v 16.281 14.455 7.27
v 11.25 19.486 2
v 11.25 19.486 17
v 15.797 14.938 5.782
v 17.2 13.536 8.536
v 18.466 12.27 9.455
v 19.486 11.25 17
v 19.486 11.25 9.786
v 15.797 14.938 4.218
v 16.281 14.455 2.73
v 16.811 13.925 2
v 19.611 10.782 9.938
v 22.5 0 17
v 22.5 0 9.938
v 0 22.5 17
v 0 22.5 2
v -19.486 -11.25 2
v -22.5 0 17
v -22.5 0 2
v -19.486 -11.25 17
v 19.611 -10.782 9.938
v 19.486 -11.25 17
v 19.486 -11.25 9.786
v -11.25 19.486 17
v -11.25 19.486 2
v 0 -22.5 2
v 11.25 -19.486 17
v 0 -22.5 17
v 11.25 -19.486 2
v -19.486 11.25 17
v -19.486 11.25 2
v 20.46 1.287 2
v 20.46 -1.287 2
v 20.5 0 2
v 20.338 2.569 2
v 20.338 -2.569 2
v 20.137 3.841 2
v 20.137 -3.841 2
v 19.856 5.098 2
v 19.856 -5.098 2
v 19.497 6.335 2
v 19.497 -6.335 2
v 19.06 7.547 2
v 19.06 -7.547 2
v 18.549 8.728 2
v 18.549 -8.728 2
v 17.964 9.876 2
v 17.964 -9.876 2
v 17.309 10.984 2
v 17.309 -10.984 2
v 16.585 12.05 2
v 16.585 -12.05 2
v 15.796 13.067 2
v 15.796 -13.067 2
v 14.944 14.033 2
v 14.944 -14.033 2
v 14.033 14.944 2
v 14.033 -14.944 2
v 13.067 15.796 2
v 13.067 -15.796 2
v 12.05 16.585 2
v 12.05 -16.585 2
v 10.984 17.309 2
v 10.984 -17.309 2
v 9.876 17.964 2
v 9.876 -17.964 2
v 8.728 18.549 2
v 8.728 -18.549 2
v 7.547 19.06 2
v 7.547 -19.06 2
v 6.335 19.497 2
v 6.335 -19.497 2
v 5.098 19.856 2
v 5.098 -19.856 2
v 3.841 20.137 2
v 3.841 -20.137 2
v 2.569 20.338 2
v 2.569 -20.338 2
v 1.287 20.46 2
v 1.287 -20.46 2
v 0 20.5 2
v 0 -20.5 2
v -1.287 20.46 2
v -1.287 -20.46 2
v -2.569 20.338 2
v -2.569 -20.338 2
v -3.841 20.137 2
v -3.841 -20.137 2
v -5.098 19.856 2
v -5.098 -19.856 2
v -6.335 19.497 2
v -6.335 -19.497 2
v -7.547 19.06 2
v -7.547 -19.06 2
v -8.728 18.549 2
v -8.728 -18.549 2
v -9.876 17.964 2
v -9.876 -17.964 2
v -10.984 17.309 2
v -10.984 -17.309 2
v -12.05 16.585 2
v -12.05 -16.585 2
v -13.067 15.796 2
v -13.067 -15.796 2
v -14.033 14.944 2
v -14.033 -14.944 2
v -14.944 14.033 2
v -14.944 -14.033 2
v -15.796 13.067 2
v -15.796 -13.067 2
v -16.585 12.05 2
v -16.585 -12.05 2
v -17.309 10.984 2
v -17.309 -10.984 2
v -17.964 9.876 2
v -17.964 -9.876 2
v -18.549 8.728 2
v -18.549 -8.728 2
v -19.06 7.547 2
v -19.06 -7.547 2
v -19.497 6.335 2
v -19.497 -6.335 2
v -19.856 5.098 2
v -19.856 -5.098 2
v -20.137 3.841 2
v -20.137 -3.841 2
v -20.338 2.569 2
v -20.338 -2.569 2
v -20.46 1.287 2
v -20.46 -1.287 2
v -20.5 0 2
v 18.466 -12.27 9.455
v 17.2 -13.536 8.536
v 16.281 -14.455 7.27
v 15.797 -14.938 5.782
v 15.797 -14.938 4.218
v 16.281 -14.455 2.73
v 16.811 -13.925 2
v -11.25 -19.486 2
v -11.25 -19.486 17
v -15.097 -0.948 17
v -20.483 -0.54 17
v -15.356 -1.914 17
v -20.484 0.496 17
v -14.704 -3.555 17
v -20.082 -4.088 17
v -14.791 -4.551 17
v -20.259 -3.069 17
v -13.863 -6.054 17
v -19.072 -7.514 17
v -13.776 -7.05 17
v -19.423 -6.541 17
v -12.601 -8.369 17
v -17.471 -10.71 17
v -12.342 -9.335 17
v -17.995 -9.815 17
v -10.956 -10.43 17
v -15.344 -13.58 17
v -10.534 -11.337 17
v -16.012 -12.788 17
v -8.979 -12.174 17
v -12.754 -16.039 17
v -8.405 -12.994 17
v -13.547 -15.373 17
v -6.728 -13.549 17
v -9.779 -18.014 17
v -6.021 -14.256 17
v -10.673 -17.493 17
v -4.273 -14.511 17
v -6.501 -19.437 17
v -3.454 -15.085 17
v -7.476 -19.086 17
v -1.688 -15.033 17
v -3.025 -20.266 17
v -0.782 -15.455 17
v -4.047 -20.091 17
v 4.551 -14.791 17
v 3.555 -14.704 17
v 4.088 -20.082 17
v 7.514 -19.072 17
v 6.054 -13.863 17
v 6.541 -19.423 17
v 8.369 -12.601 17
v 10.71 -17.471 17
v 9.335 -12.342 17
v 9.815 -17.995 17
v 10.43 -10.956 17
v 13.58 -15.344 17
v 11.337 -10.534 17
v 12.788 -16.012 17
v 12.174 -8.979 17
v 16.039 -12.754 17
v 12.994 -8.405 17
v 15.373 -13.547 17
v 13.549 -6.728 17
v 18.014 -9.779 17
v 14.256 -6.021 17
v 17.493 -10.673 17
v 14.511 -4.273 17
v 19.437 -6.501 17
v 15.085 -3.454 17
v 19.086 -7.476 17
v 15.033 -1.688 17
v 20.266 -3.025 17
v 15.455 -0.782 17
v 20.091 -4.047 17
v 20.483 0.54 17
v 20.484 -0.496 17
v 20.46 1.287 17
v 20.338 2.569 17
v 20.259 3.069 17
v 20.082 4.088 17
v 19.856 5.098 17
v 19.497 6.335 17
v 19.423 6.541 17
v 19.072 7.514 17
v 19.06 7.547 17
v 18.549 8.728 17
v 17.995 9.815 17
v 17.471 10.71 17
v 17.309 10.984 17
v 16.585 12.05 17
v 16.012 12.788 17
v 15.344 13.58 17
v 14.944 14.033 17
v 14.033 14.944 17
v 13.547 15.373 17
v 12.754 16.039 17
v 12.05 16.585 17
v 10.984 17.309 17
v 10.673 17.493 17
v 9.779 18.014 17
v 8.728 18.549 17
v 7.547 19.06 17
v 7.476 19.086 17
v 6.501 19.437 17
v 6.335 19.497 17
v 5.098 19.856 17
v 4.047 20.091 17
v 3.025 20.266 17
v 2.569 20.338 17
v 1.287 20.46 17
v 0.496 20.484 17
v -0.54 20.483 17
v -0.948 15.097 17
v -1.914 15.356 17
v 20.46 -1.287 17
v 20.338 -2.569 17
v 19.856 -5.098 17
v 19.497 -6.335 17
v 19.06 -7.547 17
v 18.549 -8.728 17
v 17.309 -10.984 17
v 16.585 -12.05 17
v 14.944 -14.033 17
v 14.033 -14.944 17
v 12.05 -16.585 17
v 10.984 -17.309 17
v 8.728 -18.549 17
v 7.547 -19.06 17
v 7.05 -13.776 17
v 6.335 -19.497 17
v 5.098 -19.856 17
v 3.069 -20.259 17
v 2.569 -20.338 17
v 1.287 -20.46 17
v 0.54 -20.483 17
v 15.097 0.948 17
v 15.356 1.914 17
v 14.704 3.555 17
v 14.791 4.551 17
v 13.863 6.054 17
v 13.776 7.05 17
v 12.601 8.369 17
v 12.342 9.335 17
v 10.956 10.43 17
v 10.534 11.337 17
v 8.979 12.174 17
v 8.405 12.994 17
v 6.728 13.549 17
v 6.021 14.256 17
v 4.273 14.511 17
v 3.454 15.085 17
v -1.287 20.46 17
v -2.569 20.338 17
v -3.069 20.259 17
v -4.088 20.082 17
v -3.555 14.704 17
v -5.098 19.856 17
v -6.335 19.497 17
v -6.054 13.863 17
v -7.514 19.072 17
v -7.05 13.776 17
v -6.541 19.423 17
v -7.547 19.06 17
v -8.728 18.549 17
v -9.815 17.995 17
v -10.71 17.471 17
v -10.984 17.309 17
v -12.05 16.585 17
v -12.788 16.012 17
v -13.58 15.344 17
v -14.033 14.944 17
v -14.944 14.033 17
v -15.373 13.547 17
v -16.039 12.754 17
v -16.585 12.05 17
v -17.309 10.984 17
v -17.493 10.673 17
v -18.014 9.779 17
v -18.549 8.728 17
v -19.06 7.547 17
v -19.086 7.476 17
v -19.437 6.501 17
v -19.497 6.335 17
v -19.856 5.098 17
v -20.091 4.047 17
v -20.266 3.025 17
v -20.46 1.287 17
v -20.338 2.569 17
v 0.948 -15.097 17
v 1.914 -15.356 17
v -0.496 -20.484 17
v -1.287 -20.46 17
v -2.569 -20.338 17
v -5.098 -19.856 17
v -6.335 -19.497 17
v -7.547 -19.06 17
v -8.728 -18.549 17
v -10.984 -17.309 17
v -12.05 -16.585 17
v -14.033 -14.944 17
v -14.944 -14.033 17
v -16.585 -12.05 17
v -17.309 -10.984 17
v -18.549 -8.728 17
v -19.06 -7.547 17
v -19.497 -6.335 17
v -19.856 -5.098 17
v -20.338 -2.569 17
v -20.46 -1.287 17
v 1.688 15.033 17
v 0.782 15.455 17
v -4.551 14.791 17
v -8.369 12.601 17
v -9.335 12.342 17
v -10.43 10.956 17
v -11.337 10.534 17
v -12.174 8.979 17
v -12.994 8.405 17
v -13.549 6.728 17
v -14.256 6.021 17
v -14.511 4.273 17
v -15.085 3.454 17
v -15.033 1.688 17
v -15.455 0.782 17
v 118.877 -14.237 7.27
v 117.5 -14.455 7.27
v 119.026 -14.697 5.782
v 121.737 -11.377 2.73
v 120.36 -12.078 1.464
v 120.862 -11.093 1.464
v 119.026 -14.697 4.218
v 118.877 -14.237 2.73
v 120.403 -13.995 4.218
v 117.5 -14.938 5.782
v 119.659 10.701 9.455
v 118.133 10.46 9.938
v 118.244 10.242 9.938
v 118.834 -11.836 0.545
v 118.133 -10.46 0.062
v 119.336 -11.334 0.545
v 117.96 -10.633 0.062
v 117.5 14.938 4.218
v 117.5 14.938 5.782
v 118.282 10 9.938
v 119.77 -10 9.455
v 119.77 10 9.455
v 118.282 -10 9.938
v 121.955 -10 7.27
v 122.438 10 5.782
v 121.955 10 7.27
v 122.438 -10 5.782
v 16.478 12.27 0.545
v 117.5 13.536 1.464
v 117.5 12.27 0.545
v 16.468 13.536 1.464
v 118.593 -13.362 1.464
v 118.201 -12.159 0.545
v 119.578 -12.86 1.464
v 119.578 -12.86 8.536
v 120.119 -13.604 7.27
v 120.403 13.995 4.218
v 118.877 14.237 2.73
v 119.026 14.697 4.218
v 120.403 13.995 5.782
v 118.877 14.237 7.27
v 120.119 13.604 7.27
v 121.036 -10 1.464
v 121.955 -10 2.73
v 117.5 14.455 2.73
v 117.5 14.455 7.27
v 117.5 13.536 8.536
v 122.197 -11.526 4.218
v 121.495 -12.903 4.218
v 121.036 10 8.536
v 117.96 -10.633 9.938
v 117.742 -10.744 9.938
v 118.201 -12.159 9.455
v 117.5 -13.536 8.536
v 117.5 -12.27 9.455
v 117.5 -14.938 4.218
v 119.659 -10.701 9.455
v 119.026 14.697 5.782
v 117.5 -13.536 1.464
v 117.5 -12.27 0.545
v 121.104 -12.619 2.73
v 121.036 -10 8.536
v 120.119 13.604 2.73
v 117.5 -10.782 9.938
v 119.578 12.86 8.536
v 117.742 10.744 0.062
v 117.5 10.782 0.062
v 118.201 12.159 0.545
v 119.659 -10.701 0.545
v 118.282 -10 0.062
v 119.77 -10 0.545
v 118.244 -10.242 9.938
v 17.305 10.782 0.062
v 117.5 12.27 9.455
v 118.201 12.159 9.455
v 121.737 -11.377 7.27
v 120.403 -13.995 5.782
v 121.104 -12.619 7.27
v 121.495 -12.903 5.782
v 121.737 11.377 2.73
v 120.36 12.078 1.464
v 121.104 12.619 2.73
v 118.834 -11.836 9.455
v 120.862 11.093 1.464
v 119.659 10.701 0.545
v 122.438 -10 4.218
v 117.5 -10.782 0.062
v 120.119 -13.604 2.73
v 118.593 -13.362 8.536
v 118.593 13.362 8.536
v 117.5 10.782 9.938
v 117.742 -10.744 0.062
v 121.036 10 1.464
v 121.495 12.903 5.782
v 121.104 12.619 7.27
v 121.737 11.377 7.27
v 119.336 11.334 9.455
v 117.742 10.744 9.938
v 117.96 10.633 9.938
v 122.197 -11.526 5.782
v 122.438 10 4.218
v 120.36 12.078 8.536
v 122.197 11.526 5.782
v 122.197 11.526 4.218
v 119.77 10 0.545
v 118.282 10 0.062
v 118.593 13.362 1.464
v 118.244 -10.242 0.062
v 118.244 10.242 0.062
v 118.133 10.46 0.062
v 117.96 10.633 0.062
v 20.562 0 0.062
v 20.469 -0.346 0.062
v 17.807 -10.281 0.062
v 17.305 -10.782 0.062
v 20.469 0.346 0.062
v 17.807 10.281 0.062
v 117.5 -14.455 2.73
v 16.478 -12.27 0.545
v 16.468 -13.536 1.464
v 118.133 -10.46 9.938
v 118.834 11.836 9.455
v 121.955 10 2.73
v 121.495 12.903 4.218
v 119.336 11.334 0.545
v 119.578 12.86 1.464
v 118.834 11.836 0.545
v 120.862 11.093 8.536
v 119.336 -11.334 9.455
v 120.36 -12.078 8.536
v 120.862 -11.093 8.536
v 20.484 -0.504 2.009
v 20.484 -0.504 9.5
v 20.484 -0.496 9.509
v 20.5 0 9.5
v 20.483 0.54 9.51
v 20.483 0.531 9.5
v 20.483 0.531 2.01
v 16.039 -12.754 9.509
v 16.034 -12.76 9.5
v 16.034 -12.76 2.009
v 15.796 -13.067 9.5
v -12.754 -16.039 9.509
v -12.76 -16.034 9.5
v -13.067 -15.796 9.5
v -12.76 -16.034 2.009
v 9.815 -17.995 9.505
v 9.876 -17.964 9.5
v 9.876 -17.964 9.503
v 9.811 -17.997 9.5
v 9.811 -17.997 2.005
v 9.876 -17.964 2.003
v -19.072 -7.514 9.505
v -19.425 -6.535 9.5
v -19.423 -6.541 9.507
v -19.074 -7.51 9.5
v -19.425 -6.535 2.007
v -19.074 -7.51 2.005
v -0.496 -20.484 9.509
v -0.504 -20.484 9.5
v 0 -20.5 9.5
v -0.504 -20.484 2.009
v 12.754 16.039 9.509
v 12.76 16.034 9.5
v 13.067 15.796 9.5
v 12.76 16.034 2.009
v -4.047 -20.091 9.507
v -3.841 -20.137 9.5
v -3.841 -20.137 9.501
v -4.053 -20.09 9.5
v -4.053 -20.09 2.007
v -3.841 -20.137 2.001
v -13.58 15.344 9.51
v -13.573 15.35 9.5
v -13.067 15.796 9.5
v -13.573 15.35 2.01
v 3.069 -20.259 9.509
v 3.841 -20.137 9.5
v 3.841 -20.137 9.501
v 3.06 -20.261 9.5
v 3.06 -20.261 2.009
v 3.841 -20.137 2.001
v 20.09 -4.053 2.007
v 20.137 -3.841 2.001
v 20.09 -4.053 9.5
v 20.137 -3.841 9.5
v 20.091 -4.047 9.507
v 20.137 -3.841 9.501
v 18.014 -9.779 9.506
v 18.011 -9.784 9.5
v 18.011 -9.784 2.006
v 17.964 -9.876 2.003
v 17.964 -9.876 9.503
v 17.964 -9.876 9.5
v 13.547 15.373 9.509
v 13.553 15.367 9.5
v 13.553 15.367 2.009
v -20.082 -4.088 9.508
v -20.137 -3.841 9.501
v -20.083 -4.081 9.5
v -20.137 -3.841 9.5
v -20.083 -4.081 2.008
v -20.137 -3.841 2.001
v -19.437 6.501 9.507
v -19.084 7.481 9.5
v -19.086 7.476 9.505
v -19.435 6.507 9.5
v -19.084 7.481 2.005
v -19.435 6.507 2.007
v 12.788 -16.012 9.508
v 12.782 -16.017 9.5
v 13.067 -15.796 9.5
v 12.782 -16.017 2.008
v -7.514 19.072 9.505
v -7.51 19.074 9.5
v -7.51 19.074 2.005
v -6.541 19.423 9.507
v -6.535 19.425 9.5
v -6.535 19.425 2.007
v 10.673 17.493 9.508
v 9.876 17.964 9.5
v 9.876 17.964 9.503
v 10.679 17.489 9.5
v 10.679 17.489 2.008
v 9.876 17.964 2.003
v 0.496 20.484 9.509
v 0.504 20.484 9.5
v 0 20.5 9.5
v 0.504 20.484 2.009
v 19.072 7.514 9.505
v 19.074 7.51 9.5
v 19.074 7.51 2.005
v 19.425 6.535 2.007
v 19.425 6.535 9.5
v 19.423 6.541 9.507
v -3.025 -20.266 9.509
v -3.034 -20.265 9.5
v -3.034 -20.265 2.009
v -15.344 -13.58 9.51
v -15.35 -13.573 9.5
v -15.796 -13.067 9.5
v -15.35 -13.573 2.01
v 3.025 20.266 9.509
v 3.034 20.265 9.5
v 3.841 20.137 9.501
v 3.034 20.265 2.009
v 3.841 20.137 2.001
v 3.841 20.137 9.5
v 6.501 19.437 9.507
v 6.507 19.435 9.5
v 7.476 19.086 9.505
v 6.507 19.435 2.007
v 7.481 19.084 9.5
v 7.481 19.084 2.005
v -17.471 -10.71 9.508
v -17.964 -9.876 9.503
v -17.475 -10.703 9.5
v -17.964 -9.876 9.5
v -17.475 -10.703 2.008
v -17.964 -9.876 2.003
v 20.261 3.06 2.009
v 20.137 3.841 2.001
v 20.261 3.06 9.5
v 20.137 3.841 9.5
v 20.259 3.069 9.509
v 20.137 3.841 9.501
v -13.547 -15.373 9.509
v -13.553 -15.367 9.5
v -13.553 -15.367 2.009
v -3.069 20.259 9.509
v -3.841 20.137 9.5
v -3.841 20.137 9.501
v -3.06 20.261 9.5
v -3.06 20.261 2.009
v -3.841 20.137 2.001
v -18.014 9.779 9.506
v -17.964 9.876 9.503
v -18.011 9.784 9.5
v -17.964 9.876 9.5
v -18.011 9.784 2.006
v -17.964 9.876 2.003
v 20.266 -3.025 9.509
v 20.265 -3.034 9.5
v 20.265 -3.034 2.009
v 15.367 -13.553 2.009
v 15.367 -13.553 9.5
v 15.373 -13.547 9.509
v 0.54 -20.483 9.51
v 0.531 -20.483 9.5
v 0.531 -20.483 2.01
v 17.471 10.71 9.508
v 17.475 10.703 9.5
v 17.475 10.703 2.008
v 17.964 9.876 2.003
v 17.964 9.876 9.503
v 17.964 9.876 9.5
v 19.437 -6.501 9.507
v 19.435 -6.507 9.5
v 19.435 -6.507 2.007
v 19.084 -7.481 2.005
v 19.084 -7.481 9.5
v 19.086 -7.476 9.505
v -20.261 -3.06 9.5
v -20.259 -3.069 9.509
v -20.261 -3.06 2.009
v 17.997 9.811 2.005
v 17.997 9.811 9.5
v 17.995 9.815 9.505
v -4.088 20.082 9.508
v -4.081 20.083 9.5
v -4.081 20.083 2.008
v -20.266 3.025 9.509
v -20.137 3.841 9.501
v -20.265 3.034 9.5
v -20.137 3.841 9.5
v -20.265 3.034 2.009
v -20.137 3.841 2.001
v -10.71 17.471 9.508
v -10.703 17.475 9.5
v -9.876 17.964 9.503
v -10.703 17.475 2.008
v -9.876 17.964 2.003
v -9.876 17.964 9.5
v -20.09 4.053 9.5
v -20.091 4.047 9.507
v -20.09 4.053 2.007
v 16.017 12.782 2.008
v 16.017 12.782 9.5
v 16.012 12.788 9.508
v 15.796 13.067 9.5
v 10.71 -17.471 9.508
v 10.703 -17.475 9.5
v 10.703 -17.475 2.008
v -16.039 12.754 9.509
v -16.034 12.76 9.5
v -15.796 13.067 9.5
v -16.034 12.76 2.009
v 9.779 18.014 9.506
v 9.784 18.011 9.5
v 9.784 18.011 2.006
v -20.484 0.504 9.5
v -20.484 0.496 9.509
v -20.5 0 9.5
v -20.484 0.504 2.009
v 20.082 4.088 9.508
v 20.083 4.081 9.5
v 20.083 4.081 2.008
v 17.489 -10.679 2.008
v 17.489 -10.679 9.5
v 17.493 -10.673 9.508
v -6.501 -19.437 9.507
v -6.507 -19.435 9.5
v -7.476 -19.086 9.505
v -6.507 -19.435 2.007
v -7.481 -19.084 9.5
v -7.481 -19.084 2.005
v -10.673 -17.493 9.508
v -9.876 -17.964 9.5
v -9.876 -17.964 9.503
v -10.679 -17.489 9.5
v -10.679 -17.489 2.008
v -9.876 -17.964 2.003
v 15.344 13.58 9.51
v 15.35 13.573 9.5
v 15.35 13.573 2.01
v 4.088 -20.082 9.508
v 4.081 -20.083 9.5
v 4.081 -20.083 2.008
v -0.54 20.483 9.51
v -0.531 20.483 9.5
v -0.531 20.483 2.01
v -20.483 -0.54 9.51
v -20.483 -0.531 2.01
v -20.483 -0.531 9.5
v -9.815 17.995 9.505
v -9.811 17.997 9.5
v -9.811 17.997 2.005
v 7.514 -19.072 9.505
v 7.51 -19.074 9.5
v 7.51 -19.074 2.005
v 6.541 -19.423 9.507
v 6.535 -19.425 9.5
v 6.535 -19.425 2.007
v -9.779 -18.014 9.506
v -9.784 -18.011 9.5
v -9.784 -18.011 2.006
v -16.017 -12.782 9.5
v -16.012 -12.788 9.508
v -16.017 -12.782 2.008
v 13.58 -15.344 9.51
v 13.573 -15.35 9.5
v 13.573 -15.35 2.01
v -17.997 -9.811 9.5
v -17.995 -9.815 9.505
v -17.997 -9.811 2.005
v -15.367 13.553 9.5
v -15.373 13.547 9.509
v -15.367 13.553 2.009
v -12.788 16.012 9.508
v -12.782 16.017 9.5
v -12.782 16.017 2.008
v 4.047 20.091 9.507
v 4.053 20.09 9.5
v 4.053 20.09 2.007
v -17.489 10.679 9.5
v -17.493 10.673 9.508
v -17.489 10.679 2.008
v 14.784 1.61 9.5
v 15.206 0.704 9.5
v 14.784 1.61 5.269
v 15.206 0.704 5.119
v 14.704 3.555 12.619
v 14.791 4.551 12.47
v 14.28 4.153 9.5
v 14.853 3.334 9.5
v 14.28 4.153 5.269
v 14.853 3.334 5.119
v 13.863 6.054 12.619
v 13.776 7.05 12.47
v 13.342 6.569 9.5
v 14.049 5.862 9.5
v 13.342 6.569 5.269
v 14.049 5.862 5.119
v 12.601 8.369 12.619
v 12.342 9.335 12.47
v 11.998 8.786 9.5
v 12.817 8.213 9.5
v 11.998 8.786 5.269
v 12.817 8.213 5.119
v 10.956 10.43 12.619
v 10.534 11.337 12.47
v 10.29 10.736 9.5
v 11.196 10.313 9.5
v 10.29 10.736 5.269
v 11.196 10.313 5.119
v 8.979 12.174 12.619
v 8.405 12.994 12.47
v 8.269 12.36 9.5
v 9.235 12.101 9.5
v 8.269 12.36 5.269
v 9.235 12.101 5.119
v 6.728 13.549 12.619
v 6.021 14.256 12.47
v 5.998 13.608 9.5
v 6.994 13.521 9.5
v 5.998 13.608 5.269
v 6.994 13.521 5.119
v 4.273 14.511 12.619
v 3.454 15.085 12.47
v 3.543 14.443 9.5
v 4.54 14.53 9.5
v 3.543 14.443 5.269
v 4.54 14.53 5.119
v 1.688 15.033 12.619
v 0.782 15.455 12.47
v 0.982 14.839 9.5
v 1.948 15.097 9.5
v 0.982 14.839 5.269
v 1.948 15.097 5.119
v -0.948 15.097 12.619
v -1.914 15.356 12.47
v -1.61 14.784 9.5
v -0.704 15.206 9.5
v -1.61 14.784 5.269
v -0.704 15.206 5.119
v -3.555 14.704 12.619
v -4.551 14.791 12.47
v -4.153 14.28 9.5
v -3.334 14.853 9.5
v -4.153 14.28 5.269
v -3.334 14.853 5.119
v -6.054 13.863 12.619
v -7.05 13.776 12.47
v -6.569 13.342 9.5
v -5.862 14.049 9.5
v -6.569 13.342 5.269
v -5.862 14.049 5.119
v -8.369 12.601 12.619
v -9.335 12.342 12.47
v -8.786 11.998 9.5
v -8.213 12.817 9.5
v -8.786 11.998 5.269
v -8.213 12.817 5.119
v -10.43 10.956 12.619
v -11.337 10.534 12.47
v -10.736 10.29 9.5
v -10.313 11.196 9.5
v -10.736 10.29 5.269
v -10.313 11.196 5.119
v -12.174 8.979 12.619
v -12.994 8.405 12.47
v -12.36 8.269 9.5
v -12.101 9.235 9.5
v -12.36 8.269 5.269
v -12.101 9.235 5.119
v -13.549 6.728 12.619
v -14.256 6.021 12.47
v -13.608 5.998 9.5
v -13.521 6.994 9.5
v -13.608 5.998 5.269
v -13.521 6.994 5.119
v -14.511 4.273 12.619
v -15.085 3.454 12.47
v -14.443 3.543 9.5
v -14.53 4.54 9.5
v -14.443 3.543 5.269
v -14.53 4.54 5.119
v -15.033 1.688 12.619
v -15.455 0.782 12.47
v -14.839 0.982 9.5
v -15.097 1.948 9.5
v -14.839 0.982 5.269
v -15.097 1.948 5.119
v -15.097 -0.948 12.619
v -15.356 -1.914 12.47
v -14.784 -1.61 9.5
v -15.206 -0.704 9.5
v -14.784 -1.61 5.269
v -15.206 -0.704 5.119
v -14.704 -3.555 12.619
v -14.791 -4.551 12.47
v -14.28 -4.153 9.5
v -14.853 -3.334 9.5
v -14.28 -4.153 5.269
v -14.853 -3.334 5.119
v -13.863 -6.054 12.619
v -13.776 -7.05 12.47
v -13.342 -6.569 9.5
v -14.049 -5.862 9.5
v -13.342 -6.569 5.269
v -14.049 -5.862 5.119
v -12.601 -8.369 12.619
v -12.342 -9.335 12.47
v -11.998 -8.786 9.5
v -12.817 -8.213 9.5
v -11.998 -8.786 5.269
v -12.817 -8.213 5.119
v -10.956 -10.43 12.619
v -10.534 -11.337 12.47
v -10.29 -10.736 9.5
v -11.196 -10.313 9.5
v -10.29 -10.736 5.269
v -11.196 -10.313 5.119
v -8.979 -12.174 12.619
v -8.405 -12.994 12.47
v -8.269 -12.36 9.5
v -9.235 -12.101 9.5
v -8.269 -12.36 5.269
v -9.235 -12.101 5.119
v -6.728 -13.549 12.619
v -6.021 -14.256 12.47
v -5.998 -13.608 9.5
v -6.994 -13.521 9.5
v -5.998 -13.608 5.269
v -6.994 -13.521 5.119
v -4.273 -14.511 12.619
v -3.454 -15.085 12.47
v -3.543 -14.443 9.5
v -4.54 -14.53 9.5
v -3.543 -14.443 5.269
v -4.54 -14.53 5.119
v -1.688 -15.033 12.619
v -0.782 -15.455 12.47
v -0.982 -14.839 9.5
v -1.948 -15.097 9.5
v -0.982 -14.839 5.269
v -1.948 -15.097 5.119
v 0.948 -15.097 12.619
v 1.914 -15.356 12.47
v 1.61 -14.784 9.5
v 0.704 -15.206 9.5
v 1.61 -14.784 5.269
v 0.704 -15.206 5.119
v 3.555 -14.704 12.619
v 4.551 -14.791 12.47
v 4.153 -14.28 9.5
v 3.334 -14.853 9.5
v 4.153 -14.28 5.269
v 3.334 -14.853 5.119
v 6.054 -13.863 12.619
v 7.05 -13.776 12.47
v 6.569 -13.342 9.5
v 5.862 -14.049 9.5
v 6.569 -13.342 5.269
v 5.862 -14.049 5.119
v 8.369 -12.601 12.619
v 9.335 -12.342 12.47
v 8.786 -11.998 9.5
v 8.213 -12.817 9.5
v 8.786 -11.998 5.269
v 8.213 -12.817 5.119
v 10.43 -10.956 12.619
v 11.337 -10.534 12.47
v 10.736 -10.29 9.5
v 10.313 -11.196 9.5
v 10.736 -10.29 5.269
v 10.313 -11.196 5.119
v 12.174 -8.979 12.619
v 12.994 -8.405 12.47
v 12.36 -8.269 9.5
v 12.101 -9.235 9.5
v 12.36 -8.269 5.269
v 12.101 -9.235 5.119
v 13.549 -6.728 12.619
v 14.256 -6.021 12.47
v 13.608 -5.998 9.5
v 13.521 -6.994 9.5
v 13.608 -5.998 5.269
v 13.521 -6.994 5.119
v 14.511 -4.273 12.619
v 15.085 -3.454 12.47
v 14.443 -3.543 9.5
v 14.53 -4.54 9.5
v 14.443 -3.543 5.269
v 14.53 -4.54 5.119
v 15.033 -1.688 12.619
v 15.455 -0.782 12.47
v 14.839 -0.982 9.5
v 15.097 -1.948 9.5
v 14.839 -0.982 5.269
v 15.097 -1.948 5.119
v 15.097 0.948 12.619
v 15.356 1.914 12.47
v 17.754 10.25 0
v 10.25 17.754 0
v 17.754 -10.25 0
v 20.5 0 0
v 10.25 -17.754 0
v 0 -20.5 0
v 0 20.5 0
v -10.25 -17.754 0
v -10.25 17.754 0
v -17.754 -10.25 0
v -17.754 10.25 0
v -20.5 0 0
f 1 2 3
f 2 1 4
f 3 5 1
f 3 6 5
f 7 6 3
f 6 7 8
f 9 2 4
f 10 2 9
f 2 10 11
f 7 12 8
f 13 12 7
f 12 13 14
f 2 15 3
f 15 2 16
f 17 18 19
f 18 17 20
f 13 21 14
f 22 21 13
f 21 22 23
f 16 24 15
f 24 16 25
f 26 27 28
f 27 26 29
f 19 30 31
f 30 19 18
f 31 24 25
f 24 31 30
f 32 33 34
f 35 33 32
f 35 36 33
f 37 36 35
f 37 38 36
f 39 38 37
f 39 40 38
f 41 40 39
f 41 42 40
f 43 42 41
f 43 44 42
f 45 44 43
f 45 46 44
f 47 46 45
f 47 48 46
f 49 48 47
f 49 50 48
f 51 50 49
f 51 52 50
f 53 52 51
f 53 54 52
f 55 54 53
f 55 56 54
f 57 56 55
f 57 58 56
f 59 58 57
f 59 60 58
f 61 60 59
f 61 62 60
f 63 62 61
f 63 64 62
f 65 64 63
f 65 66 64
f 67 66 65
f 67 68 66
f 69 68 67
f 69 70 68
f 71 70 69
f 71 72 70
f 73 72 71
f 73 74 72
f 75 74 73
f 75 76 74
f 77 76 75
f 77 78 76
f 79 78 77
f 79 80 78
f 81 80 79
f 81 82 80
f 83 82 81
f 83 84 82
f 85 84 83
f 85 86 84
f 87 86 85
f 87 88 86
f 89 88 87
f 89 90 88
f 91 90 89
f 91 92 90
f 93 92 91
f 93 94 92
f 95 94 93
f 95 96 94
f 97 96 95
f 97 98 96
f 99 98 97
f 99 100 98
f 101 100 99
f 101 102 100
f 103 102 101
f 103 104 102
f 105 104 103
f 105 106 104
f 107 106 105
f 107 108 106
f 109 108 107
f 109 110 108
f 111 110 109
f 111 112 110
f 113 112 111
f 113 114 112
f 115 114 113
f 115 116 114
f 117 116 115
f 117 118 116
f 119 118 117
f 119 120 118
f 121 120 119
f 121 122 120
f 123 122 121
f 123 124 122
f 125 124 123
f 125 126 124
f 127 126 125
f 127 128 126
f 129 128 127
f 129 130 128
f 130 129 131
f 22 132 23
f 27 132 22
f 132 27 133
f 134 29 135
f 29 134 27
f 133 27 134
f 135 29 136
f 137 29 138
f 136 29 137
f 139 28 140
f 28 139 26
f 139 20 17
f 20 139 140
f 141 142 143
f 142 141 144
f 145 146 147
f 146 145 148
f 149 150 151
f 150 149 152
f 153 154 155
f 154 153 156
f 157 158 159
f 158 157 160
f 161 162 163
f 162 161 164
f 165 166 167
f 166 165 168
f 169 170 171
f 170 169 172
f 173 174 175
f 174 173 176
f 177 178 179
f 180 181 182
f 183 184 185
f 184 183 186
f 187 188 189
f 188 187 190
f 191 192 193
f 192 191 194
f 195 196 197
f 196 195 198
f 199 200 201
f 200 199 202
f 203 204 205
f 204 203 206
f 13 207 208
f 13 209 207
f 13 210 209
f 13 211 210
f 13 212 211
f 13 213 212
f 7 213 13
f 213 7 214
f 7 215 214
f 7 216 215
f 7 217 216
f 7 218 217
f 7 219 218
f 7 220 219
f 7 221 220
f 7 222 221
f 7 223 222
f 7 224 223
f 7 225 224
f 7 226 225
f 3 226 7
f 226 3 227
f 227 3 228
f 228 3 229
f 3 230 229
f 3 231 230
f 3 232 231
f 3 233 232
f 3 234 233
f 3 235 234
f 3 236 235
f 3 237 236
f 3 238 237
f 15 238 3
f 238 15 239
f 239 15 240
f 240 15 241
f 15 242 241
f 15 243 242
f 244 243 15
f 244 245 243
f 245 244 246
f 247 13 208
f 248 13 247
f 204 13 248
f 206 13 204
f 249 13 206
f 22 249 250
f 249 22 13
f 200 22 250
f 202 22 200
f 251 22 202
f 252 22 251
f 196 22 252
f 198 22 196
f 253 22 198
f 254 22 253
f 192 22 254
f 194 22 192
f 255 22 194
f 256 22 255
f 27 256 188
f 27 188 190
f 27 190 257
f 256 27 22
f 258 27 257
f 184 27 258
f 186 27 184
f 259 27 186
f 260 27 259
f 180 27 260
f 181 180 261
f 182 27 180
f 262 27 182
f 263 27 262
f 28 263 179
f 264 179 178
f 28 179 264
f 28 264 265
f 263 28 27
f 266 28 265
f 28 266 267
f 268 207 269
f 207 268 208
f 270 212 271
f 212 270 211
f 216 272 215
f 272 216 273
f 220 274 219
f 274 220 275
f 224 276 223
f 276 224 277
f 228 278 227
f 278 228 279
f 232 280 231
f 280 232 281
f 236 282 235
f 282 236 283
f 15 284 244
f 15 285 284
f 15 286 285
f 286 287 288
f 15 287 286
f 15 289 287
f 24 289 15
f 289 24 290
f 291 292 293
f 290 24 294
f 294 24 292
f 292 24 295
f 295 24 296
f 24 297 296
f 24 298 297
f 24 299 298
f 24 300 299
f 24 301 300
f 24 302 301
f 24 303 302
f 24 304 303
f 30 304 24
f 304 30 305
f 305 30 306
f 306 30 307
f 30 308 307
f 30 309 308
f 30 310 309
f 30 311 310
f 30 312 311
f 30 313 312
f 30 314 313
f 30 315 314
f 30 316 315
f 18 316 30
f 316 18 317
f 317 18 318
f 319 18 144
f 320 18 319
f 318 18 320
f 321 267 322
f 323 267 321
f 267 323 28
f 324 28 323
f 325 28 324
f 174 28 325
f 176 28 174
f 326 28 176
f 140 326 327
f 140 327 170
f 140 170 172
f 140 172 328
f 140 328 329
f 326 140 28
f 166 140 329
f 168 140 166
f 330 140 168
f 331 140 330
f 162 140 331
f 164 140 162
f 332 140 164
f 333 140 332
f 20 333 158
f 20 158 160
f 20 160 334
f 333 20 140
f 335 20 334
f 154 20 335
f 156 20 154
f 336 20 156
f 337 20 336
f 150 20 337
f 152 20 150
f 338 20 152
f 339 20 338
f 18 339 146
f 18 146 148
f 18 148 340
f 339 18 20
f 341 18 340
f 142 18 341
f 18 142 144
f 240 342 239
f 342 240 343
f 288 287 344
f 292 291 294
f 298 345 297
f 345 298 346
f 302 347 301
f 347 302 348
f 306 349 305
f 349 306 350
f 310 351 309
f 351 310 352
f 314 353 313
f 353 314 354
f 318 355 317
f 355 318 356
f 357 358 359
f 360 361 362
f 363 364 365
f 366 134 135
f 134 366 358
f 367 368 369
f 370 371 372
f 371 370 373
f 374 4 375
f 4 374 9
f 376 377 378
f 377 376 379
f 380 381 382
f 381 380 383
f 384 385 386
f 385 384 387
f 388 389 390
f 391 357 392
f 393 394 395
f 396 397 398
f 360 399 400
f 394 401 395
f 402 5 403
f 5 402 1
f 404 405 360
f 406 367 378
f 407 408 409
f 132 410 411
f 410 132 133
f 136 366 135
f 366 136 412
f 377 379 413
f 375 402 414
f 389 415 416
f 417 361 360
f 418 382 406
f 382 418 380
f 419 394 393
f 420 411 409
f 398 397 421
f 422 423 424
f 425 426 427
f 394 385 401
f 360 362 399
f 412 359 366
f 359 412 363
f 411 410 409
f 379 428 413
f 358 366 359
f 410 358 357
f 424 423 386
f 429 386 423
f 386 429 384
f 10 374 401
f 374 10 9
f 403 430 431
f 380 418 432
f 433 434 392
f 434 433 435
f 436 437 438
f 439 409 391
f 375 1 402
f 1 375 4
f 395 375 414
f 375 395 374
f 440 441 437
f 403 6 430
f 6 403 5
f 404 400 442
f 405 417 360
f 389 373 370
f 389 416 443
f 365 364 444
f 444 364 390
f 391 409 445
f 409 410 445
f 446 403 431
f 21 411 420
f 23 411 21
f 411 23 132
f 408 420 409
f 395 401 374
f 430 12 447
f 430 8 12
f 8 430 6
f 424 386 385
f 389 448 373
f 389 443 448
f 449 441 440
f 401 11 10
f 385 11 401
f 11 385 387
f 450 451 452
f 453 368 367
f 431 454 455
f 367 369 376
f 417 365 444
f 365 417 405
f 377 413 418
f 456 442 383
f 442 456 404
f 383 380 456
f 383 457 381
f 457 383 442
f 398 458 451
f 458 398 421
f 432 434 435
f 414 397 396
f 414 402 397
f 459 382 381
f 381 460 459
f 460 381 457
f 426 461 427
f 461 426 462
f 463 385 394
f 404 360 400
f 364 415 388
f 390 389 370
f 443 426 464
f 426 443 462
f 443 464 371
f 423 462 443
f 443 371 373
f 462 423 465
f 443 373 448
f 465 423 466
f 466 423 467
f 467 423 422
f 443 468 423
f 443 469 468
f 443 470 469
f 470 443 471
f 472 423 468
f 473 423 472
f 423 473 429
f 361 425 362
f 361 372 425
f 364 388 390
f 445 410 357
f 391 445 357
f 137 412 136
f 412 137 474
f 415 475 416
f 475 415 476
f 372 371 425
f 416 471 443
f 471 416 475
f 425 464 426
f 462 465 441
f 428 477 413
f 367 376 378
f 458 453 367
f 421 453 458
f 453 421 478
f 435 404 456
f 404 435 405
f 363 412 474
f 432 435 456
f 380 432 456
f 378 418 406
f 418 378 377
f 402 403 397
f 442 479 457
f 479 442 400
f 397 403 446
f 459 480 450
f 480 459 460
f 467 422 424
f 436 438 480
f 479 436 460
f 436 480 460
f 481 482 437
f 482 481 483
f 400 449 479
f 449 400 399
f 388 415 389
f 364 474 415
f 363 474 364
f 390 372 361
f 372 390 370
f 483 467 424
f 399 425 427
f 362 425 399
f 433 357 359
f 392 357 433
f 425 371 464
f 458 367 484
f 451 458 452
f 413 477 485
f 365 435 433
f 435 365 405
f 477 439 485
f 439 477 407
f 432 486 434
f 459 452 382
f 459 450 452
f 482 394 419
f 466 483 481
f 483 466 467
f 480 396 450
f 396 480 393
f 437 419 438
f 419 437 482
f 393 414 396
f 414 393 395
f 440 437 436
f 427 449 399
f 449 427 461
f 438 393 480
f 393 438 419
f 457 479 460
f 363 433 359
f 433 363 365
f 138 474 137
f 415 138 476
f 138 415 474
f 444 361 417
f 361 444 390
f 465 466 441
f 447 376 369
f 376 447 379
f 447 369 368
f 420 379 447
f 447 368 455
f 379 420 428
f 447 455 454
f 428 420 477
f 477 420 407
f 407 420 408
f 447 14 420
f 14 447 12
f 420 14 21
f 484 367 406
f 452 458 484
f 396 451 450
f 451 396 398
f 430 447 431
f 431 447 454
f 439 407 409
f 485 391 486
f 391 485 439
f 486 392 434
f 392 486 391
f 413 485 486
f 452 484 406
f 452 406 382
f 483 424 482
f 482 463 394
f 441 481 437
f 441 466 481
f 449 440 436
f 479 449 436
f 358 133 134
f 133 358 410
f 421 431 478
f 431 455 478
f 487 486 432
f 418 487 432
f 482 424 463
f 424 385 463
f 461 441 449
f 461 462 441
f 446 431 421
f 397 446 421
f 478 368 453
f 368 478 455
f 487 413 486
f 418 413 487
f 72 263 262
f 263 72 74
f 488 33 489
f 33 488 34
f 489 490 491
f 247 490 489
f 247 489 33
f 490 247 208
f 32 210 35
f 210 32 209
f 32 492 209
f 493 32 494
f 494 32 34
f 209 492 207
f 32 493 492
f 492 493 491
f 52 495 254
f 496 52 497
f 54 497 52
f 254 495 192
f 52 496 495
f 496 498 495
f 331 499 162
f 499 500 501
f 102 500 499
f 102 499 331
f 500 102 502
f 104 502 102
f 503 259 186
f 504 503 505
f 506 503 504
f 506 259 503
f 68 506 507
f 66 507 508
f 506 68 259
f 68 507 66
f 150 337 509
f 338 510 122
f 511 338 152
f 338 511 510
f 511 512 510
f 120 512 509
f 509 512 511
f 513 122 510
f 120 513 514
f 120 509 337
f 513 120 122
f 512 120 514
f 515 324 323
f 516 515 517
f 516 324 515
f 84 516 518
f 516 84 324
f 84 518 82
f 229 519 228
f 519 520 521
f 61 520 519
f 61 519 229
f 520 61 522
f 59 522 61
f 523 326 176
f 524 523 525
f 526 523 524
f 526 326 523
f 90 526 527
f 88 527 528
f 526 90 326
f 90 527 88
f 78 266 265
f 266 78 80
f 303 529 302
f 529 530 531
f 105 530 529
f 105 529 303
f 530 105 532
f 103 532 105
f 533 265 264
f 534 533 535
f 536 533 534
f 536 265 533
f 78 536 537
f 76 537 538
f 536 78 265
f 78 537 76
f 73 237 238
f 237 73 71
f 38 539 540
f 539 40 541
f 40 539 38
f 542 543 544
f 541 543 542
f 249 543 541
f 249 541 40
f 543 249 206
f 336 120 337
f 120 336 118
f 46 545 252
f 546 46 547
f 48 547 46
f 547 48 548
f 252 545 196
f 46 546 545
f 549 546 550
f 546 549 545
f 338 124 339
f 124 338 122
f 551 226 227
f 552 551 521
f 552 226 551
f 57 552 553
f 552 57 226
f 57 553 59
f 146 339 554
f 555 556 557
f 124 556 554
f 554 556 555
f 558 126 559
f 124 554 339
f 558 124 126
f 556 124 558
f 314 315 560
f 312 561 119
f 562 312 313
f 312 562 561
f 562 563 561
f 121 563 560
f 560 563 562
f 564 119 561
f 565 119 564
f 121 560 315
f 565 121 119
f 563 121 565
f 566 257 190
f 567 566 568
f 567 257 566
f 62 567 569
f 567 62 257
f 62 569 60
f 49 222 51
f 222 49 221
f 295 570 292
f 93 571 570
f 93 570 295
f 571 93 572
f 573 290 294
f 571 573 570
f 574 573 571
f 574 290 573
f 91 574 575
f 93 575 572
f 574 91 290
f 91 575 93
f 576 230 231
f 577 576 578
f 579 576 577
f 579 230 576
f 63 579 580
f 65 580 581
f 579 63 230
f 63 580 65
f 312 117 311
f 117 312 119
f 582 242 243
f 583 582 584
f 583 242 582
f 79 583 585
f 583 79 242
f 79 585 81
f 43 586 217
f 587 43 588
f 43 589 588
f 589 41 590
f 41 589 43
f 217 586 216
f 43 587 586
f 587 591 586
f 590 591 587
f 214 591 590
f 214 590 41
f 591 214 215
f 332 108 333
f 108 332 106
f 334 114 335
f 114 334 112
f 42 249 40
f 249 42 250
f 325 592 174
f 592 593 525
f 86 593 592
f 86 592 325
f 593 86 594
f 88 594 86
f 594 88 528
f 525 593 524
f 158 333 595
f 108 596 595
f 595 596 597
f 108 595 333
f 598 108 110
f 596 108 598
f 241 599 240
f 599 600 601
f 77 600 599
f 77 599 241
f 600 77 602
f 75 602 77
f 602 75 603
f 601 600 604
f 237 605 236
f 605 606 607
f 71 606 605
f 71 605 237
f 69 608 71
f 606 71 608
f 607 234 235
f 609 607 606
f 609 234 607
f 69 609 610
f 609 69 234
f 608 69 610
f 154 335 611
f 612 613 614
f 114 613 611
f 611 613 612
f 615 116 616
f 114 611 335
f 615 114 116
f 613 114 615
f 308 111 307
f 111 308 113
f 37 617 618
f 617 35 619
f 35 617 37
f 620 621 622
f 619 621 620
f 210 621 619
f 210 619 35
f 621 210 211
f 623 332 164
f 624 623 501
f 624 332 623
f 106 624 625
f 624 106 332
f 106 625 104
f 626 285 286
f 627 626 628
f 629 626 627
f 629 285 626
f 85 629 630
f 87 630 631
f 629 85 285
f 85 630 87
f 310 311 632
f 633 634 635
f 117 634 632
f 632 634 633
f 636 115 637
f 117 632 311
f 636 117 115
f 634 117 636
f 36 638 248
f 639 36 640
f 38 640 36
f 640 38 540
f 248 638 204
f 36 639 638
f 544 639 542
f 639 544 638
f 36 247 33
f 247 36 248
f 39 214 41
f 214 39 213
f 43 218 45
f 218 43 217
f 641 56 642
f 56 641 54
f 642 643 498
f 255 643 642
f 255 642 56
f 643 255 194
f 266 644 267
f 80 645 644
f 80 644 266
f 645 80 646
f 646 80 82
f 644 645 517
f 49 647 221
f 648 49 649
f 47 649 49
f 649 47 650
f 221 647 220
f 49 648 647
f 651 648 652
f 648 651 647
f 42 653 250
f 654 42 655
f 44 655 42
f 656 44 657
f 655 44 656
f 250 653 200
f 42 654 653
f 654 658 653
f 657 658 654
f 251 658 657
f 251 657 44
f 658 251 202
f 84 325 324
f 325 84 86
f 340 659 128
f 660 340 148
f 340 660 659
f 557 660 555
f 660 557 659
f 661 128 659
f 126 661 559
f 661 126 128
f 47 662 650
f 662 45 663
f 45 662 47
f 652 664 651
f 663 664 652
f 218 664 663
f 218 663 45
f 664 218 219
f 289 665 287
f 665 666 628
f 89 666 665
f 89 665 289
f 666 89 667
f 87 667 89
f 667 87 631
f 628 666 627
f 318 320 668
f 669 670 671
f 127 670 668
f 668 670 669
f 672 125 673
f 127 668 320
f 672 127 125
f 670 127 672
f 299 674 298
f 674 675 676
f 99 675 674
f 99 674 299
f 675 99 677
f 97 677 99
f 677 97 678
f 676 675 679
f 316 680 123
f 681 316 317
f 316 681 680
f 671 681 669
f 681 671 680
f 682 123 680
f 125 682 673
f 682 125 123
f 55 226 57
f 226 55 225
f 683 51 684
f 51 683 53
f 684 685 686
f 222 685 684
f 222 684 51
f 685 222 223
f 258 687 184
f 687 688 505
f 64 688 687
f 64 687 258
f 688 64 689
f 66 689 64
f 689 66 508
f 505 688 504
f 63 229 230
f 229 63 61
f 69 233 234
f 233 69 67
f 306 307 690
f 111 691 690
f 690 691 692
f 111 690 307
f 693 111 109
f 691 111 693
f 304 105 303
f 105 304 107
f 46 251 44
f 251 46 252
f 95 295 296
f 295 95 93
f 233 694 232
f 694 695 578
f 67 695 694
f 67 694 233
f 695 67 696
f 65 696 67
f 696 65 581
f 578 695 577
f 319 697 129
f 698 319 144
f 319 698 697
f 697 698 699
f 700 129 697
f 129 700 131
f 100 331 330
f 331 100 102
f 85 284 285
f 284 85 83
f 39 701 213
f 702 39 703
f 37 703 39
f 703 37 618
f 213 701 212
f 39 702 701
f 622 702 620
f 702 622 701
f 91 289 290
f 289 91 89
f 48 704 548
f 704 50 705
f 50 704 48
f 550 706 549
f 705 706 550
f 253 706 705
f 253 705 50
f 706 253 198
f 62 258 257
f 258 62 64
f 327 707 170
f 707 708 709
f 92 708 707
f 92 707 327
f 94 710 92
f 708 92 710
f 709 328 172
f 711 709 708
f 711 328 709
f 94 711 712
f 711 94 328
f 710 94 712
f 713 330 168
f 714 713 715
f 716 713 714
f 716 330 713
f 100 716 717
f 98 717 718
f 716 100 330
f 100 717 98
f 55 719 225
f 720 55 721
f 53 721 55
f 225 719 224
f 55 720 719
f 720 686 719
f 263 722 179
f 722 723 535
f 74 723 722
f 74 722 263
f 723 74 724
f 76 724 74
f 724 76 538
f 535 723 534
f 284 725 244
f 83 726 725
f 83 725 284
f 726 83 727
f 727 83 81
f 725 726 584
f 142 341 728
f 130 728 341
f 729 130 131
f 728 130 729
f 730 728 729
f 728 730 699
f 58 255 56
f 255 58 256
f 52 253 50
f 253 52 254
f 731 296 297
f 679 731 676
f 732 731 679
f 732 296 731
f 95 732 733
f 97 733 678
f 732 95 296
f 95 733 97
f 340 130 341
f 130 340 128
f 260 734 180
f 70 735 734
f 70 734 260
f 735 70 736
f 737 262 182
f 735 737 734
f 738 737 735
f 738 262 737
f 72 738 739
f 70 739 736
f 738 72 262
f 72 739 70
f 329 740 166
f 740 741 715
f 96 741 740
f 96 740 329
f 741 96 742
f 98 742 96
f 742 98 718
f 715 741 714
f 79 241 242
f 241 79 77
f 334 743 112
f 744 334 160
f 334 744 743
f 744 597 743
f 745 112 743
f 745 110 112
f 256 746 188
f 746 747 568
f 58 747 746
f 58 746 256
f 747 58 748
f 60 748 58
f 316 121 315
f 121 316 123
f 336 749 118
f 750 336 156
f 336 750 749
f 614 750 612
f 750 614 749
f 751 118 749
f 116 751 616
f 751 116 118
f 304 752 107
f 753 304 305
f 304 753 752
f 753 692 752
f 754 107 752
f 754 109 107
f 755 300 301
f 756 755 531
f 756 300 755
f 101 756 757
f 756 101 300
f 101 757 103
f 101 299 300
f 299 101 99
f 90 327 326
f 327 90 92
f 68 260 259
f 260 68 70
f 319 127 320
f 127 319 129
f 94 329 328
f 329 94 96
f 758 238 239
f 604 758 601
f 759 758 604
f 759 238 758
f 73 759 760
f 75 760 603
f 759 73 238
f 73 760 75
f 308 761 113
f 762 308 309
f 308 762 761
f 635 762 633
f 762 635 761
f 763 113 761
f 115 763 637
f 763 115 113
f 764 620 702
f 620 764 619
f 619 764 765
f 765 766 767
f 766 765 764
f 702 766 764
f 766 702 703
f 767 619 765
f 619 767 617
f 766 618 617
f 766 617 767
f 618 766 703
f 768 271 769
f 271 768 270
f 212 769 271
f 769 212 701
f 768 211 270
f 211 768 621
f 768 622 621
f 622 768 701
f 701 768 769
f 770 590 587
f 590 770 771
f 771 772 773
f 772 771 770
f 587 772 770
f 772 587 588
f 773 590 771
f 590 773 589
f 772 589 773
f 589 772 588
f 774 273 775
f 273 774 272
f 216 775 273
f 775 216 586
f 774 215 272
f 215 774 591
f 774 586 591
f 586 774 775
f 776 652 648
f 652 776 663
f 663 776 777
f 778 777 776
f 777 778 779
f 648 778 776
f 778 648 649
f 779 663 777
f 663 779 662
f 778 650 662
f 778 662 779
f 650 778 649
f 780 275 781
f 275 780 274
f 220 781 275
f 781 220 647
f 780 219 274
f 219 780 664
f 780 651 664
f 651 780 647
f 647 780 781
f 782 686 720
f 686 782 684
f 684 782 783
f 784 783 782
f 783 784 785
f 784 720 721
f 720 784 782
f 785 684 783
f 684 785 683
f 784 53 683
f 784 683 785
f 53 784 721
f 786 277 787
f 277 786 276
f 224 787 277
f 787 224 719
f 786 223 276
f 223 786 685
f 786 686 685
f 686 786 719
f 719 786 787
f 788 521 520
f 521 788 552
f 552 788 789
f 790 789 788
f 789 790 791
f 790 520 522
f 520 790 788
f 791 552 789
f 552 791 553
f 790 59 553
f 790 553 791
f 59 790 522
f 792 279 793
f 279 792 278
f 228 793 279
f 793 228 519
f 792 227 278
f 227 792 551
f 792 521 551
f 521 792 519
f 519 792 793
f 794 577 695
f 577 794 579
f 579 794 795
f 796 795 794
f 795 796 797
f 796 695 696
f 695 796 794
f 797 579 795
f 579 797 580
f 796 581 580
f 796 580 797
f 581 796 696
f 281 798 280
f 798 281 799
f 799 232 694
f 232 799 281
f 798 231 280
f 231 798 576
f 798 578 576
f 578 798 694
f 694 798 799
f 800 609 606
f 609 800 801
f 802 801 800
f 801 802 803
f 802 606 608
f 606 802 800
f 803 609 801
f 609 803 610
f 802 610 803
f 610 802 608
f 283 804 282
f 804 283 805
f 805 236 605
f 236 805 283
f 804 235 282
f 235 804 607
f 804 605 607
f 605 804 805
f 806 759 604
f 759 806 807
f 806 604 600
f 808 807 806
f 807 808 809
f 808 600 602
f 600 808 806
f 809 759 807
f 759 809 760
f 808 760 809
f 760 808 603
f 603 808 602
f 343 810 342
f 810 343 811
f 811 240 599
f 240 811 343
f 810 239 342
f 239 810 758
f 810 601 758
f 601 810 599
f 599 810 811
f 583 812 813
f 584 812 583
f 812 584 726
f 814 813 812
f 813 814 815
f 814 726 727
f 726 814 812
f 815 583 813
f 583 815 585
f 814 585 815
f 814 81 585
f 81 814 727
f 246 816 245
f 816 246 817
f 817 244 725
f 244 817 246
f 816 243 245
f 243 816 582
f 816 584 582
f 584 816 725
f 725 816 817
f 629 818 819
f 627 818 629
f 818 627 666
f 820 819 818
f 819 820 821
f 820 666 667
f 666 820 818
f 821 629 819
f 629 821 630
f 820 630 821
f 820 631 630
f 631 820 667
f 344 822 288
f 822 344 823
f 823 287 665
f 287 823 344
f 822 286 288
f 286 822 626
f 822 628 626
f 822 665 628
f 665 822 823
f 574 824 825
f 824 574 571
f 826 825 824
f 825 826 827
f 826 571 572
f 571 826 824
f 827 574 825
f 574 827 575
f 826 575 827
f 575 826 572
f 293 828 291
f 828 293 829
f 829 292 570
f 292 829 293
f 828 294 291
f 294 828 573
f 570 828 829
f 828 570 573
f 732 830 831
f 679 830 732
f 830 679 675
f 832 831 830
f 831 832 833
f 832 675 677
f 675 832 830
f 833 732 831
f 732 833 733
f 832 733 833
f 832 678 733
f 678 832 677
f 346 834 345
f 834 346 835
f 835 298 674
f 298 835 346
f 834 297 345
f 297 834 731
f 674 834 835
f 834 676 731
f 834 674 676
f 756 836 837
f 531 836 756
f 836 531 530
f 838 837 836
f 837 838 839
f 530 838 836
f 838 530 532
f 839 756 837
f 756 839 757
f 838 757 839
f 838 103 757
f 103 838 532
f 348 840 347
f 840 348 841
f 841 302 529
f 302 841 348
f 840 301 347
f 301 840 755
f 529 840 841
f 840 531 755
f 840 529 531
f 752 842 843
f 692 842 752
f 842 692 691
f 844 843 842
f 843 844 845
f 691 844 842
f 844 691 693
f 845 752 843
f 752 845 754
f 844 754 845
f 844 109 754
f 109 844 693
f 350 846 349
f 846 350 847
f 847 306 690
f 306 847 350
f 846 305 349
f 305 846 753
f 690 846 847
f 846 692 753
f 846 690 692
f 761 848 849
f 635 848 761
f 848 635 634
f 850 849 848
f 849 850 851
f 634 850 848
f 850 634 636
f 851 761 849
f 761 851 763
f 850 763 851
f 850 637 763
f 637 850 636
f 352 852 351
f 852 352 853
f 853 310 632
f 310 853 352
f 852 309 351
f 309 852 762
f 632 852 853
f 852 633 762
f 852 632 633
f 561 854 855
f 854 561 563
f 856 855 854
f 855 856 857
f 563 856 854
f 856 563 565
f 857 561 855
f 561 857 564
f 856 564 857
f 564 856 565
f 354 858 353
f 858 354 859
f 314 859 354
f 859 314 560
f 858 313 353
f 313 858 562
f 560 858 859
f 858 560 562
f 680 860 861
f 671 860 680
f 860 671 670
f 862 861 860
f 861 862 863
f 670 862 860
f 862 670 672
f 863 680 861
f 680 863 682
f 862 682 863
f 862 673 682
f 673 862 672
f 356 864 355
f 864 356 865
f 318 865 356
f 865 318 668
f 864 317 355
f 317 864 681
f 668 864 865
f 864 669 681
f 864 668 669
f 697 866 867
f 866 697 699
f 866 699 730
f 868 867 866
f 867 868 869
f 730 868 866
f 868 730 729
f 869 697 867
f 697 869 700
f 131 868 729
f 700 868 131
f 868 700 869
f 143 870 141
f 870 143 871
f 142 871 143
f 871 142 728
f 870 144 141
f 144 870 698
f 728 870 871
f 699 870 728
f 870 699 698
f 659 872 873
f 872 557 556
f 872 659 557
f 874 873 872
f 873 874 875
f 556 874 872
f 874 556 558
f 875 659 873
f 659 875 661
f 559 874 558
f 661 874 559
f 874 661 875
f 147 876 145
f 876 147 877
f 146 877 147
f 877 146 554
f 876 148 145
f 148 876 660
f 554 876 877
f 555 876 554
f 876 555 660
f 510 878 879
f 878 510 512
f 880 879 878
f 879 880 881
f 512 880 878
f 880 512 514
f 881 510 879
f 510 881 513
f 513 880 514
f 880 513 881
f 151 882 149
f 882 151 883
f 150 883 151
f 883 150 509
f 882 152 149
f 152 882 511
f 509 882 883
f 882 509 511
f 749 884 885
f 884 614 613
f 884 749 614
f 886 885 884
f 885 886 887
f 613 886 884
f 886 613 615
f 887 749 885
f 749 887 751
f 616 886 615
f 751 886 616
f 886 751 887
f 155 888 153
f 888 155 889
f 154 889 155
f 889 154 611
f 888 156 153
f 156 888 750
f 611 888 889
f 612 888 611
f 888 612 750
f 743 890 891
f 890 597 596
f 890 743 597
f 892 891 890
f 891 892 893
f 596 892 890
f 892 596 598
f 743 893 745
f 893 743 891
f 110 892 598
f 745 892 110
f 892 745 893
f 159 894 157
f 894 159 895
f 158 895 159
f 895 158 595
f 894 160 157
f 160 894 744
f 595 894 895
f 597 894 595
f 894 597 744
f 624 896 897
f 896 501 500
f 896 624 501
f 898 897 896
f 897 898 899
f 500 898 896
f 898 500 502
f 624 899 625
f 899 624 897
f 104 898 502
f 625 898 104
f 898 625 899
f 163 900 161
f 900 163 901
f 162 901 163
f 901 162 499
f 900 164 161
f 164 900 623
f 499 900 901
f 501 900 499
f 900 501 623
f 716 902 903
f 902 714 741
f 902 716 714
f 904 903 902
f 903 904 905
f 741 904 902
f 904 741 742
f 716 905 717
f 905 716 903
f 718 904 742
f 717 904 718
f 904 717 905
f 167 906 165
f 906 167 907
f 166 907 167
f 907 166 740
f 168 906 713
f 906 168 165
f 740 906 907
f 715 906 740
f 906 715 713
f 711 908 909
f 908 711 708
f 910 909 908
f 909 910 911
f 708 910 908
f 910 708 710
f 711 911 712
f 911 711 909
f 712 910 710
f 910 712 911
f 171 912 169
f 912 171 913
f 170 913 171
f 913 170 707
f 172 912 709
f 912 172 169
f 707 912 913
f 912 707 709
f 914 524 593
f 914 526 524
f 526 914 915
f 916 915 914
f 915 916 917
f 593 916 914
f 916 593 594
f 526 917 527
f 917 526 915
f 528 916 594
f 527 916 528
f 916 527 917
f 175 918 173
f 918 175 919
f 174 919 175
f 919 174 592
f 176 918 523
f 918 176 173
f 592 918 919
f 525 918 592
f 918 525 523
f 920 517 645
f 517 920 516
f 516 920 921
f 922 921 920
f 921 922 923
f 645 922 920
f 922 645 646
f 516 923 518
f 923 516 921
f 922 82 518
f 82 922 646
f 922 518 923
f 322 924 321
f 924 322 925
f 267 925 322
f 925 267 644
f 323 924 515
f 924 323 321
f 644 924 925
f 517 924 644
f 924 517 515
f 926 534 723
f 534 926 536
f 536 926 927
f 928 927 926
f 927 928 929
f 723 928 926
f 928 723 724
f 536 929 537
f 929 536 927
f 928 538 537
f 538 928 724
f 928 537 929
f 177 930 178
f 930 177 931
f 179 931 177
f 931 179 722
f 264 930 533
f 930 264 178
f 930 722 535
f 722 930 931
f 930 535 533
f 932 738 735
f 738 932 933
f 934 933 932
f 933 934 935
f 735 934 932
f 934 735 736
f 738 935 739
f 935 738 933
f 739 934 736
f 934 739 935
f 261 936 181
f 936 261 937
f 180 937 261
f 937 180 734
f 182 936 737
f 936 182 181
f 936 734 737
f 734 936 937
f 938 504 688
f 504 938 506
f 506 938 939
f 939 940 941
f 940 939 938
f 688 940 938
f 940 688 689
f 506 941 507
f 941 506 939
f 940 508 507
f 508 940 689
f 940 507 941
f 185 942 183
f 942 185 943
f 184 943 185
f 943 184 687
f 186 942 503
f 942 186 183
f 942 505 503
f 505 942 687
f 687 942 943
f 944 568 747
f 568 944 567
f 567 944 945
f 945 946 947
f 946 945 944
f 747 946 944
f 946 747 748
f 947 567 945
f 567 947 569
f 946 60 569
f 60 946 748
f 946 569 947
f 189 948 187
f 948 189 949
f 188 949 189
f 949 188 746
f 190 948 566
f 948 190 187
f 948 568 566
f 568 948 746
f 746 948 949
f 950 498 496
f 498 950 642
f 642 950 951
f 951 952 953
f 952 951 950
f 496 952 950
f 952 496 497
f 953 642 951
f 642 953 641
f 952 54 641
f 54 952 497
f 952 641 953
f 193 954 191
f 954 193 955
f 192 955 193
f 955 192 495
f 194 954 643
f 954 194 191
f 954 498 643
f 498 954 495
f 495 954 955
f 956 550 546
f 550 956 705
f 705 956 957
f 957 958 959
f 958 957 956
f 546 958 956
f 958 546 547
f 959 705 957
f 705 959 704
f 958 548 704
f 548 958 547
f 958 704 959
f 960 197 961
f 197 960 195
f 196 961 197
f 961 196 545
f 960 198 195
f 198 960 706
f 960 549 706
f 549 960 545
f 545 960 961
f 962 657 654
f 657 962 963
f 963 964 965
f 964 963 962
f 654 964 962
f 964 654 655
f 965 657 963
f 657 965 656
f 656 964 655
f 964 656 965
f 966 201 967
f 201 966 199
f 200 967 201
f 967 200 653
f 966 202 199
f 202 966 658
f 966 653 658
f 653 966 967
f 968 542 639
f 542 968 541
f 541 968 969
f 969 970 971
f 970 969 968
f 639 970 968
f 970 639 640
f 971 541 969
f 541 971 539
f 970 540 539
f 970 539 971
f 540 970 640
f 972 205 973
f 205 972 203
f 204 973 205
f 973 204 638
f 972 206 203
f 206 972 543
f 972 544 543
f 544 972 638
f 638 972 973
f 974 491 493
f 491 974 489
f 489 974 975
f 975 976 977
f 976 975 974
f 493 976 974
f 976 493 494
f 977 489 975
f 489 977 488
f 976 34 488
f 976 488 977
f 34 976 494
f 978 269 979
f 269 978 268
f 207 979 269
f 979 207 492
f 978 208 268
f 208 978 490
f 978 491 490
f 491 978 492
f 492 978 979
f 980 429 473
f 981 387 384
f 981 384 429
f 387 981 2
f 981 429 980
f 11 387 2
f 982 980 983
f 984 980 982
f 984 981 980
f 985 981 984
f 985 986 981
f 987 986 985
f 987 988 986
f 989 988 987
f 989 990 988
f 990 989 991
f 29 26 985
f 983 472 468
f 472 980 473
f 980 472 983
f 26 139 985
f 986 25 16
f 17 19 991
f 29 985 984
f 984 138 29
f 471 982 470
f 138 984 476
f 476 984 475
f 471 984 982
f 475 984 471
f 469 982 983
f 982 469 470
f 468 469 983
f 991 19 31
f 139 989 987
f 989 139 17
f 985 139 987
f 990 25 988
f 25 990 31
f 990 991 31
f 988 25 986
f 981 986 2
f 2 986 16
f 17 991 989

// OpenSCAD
// [FL_INDEX: keywords="openscad, 3d_parametric, 2_Liter_Soda_Bottle_Opener_AND_Closer_Wrench, csg_solid" | COT="Parametric OpenSCAD design from 3DCodeverse"]
// Title: 2 Liter Soda Bottle Opener AND Closer Wrench

//parametric ›soda bottle opener and closer wrench
//John Finch 12/6/13


cap_dia = 30.5;
cap_height = 15;
interference = .01;  //fraction the spine protruding into cap diameter
handle_length = 100;
handle = "yes";  // yes or no

outer_dia = 45;
inner_dia = cap_dia * (1-interference);
wall_thickness = 2;
spine_angle = 15;
spine_thickness = 1;
num_spines = 36;

spine_length = (outer_dia/2-wall_thickness-inner_dia/2)/cos(spine_angle);

fa=0.1;
fs=0.5;

module roundedCube(size, radius)  //Using hull() and spheres
{
x = size[0];
y = size[1];
z = size[2];
fn=20;

//Set bounds on the radius 
radius=max(0.1,radius);
radius=min(radius,min(x,min(y,z))/2);
//echo ("Radius= ",radius);

//echo (x, y, z, radius);


hull()
	{
	translate([radius,radius,radius])
	sphere(r=radius,$fn=fn);

	translate([radius,radius,z-radius])
	sphere(r=radius,$fn=fn);

	translate([x-radius,radius,radius])
	sphere(r=radius,$fn=fn);

	translate([x-radius,radius,z-radius])
	sphere(r=radius,$fn=fn);

	translate([radius,y-radius,radius])
	sphere(r=radius,$fn=fn);

	translate([radius,y-radius,z-radius])
	sphere(r=radius,$fn=fn);

	translate([x-radius,y-radius,radius])
	sphere(r=radius,$fn=fn);

	translate([x-radius,y-radius,z-radius])
	sphere(r=radius,$fn=fn);

	
	

	}
}
module spine(){
//echo(outer_dia/2-wall_thickness-spine_length);
//echo(-spine_thickness/2);
difference(){
	
		translate ([outer_dia/2-wall_thickness-spine_length*cos(spine_angle),-spine_thickness/2-spine_length*sin(spine_angle),0])
		rotate([0,0,spine_angle])
		cube([spine_length+.5,spine_thickness,cap_height/2]);
	

	translate([outer_dia/2-wall_thickness-spine_length,spine_length/2,0])
	rotate([90,0,0])
	cylinder(h=spine_length,r1=spine_length, r2=spine_length,$fn=3);
	}

	difference(){
	
	translate ([outer_dia/2-wall_thickness-spine_length*cos(spine_angle),-spine_thickness/2+spine_length*sin(spine_angle),cap_height/2])
	rotate([0,0,-spine_angle])
	cube([spine_length+.5,spine_thickness,cap_height/2]);

	translate([outer_dia/2-wall_thickness-spine_length,spine_length/2,cap_height/2])
	rotate([90,0,0])
	cylinder(h=spine_length,r1=spine_length, r2=spine_length,$fn=3);
	}




}


translate([0,0,2])
difference(){
	union(){
		cylinder(h = cap_height, r1 = outer_dia/2, r2 = outer_dia/2, $fn=12);
		//Insert handle
		if (handle == "yes"){
		translate([0,-15,-2])
		roundedCube([handle_length+outer_dia/2,30,10],5);
		}
	}
	
	cylinder(h = cap_height, r1 = outer_dia/2-wall_thickness, r2 = outer_dia/2-wall_thickness, $fn=100); // $fa=fa, $fs=fs);

	}
rot_angle = 360/num_spines;
translate([0,0,2])
for ( i = [ 1 : num_spines ] )
	{
	rotate([0,0,i*rot_angle])
	spine();
	}

translate([0,0,0])
cylinder(h = 2, r1 = outer_dia/2-2, r2 = outer_dia/2, $fn=12);



//spine();
